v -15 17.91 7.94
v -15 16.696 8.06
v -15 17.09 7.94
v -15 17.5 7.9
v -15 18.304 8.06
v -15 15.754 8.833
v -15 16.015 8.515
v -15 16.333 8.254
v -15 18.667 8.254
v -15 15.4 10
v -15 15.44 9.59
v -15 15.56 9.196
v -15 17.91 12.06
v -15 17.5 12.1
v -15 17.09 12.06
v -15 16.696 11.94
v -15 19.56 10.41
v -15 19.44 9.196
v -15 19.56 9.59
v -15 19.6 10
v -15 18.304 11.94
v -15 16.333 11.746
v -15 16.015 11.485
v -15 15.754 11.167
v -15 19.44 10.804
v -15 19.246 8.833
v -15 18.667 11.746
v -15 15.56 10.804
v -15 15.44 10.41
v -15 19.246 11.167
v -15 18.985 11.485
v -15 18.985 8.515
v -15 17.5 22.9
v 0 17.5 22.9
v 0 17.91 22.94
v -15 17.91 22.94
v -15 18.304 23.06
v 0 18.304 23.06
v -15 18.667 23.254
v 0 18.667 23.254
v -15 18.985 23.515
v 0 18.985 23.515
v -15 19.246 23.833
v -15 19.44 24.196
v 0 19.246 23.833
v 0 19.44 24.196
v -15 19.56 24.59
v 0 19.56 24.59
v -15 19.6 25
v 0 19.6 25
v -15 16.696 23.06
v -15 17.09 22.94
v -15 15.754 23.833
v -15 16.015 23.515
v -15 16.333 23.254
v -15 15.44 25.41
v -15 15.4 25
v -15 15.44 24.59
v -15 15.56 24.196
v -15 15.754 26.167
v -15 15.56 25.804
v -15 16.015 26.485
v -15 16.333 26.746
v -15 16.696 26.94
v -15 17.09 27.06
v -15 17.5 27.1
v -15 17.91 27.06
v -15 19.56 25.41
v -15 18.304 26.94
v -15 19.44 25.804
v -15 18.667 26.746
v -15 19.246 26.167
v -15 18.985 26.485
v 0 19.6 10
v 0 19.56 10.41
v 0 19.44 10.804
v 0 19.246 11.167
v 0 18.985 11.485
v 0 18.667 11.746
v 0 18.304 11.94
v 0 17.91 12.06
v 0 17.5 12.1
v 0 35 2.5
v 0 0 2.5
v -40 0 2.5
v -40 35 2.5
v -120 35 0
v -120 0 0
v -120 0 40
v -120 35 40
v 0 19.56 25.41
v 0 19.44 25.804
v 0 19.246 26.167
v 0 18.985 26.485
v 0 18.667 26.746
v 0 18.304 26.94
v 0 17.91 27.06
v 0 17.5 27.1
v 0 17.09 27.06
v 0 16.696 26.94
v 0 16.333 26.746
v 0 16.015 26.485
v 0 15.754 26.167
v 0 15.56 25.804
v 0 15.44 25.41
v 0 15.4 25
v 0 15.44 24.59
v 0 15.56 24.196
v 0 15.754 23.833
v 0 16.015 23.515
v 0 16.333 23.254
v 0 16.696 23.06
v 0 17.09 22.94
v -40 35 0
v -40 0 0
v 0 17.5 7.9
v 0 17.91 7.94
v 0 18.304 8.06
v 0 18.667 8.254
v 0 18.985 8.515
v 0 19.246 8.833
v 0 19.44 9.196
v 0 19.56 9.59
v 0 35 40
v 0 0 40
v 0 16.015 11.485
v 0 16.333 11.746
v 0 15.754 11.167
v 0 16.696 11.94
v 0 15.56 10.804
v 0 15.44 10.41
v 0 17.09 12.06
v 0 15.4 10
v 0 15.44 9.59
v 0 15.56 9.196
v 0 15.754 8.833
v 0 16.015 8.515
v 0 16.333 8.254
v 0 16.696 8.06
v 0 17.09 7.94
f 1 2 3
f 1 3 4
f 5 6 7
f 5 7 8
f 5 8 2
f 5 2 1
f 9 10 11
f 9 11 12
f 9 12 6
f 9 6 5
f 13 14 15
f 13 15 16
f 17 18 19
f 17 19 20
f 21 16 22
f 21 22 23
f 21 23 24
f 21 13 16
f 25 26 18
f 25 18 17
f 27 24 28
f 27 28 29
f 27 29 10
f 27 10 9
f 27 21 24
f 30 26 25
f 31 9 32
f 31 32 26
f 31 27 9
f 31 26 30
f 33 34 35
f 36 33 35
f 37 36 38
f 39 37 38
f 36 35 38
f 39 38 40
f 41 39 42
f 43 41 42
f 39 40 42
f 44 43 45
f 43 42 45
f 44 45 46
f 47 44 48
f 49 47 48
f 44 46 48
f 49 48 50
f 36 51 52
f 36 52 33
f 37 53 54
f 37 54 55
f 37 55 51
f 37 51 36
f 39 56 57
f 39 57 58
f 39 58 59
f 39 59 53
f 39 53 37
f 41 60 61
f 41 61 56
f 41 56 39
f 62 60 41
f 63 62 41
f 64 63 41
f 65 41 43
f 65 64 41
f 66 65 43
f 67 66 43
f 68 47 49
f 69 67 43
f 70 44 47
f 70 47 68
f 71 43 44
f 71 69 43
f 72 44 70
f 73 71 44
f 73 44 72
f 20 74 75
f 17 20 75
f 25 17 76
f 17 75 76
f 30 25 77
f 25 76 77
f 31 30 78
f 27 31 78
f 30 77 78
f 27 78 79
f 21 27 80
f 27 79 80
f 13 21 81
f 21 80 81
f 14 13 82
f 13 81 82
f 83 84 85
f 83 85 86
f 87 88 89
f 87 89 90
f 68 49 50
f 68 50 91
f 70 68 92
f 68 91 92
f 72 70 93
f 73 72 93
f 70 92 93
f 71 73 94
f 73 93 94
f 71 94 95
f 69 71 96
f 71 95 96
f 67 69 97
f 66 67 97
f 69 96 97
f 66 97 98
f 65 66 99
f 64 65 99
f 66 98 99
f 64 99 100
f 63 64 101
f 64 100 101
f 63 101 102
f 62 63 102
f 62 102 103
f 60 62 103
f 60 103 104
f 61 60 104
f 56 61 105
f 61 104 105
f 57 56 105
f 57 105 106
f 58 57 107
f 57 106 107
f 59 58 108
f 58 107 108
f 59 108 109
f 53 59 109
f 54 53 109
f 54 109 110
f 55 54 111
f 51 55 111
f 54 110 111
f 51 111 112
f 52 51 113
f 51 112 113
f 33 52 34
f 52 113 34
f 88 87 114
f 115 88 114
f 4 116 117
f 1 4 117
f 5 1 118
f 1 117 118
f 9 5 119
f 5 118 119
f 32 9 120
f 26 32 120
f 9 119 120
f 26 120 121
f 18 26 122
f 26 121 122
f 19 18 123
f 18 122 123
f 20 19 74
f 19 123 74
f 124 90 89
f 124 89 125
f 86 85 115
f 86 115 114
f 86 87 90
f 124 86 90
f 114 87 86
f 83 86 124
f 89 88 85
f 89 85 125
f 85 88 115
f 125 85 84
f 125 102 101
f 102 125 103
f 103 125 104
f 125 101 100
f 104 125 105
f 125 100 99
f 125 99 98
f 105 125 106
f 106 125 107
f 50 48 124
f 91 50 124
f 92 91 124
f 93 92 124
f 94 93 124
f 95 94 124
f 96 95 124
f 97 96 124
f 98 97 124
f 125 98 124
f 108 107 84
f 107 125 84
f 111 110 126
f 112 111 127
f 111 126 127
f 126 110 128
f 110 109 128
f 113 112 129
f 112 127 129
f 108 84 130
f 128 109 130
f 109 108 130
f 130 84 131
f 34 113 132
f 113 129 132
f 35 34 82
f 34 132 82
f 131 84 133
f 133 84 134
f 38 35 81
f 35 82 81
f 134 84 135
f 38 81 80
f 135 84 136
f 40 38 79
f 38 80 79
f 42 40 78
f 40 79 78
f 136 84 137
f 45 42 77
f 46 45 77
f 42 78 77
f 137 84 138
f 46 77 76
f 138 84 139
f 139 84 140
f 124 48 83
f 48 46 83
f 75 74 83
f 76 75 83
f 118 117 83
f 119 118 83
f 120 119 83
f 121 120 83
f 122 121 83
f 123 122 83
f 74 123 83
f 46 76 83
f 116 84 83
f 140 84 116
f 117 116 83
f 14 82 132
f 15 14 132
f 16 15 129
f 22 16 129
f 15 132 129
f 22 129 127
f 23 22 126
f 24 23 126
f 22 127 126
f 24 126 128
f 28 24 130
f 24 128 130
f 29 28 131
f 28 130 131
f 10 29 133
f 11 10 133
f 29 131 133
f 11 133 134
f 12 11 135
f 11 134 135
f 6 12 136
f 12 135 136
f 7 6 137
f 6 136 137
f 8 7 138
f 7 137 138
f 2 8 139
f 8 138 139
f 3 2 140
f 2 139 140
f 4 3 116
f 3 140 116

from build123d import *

# Parameters (mm, degrees)
F0_W     = 120
F0_H     = 35
F1_DEPTH = 40
F3_DEPTH = 15
F4_W     = 35
F4_H     = 2.5
F5_DEPTH = 40


with BuildPart() as f1:
    # F0 (on Top) → F1 (new body)
    with BuildSketch(Plane.XY):
        with Locations((-60, 17.5)):
            Rectangle(F0_W, F0_H)
    extrude(amount=F1_DEPTH)

    # F2 (on face) → F3 (cut)
    with BuildSketch(Plane.YZ):
        with BuildLine():
            ThreePointArc((17.5, 12.1), (15.4, 10), (17.5, 7.9))
            Line((17.5, 7.9), (17.5, 10))
            Line((17.5, 10), (17.5, 12.1))
        make_face()
        with BuildLine():
            ThreePointArc((19.6, 25), (16.015076, 26.484924), (17.5, 22.9))
            ThreePointArc((17.5, 22.9), (18.984924, 23.515076), (19.6, 25))
        make_face()
        with BuildLine():
            Line((17.5, 10), (17.5, 7.9))
            ThreePointArc((17.5, 7.9), (18.984924, 8.515076), (19.6, 10))
            ThreePointArc((19.6, 10), (18.984924, 11.484924), (17.5, 12.1))
            Line((17.5, 12.1), (17.5, 10))
        make_face()
    extrude(amount=-F3_DEPTH, mode=Mode.SUBTRACT)

    # F4 (on face) → F5 (cut)
    with BuildSketch(Plane.YZ):
        with Locations((17.5, 1.25)):
            Rectangle(F4_W, F4_H)
    extrude(amount=-F5_DEPTH, mode=Mode.SUBTRACT)


solid = f1.part
